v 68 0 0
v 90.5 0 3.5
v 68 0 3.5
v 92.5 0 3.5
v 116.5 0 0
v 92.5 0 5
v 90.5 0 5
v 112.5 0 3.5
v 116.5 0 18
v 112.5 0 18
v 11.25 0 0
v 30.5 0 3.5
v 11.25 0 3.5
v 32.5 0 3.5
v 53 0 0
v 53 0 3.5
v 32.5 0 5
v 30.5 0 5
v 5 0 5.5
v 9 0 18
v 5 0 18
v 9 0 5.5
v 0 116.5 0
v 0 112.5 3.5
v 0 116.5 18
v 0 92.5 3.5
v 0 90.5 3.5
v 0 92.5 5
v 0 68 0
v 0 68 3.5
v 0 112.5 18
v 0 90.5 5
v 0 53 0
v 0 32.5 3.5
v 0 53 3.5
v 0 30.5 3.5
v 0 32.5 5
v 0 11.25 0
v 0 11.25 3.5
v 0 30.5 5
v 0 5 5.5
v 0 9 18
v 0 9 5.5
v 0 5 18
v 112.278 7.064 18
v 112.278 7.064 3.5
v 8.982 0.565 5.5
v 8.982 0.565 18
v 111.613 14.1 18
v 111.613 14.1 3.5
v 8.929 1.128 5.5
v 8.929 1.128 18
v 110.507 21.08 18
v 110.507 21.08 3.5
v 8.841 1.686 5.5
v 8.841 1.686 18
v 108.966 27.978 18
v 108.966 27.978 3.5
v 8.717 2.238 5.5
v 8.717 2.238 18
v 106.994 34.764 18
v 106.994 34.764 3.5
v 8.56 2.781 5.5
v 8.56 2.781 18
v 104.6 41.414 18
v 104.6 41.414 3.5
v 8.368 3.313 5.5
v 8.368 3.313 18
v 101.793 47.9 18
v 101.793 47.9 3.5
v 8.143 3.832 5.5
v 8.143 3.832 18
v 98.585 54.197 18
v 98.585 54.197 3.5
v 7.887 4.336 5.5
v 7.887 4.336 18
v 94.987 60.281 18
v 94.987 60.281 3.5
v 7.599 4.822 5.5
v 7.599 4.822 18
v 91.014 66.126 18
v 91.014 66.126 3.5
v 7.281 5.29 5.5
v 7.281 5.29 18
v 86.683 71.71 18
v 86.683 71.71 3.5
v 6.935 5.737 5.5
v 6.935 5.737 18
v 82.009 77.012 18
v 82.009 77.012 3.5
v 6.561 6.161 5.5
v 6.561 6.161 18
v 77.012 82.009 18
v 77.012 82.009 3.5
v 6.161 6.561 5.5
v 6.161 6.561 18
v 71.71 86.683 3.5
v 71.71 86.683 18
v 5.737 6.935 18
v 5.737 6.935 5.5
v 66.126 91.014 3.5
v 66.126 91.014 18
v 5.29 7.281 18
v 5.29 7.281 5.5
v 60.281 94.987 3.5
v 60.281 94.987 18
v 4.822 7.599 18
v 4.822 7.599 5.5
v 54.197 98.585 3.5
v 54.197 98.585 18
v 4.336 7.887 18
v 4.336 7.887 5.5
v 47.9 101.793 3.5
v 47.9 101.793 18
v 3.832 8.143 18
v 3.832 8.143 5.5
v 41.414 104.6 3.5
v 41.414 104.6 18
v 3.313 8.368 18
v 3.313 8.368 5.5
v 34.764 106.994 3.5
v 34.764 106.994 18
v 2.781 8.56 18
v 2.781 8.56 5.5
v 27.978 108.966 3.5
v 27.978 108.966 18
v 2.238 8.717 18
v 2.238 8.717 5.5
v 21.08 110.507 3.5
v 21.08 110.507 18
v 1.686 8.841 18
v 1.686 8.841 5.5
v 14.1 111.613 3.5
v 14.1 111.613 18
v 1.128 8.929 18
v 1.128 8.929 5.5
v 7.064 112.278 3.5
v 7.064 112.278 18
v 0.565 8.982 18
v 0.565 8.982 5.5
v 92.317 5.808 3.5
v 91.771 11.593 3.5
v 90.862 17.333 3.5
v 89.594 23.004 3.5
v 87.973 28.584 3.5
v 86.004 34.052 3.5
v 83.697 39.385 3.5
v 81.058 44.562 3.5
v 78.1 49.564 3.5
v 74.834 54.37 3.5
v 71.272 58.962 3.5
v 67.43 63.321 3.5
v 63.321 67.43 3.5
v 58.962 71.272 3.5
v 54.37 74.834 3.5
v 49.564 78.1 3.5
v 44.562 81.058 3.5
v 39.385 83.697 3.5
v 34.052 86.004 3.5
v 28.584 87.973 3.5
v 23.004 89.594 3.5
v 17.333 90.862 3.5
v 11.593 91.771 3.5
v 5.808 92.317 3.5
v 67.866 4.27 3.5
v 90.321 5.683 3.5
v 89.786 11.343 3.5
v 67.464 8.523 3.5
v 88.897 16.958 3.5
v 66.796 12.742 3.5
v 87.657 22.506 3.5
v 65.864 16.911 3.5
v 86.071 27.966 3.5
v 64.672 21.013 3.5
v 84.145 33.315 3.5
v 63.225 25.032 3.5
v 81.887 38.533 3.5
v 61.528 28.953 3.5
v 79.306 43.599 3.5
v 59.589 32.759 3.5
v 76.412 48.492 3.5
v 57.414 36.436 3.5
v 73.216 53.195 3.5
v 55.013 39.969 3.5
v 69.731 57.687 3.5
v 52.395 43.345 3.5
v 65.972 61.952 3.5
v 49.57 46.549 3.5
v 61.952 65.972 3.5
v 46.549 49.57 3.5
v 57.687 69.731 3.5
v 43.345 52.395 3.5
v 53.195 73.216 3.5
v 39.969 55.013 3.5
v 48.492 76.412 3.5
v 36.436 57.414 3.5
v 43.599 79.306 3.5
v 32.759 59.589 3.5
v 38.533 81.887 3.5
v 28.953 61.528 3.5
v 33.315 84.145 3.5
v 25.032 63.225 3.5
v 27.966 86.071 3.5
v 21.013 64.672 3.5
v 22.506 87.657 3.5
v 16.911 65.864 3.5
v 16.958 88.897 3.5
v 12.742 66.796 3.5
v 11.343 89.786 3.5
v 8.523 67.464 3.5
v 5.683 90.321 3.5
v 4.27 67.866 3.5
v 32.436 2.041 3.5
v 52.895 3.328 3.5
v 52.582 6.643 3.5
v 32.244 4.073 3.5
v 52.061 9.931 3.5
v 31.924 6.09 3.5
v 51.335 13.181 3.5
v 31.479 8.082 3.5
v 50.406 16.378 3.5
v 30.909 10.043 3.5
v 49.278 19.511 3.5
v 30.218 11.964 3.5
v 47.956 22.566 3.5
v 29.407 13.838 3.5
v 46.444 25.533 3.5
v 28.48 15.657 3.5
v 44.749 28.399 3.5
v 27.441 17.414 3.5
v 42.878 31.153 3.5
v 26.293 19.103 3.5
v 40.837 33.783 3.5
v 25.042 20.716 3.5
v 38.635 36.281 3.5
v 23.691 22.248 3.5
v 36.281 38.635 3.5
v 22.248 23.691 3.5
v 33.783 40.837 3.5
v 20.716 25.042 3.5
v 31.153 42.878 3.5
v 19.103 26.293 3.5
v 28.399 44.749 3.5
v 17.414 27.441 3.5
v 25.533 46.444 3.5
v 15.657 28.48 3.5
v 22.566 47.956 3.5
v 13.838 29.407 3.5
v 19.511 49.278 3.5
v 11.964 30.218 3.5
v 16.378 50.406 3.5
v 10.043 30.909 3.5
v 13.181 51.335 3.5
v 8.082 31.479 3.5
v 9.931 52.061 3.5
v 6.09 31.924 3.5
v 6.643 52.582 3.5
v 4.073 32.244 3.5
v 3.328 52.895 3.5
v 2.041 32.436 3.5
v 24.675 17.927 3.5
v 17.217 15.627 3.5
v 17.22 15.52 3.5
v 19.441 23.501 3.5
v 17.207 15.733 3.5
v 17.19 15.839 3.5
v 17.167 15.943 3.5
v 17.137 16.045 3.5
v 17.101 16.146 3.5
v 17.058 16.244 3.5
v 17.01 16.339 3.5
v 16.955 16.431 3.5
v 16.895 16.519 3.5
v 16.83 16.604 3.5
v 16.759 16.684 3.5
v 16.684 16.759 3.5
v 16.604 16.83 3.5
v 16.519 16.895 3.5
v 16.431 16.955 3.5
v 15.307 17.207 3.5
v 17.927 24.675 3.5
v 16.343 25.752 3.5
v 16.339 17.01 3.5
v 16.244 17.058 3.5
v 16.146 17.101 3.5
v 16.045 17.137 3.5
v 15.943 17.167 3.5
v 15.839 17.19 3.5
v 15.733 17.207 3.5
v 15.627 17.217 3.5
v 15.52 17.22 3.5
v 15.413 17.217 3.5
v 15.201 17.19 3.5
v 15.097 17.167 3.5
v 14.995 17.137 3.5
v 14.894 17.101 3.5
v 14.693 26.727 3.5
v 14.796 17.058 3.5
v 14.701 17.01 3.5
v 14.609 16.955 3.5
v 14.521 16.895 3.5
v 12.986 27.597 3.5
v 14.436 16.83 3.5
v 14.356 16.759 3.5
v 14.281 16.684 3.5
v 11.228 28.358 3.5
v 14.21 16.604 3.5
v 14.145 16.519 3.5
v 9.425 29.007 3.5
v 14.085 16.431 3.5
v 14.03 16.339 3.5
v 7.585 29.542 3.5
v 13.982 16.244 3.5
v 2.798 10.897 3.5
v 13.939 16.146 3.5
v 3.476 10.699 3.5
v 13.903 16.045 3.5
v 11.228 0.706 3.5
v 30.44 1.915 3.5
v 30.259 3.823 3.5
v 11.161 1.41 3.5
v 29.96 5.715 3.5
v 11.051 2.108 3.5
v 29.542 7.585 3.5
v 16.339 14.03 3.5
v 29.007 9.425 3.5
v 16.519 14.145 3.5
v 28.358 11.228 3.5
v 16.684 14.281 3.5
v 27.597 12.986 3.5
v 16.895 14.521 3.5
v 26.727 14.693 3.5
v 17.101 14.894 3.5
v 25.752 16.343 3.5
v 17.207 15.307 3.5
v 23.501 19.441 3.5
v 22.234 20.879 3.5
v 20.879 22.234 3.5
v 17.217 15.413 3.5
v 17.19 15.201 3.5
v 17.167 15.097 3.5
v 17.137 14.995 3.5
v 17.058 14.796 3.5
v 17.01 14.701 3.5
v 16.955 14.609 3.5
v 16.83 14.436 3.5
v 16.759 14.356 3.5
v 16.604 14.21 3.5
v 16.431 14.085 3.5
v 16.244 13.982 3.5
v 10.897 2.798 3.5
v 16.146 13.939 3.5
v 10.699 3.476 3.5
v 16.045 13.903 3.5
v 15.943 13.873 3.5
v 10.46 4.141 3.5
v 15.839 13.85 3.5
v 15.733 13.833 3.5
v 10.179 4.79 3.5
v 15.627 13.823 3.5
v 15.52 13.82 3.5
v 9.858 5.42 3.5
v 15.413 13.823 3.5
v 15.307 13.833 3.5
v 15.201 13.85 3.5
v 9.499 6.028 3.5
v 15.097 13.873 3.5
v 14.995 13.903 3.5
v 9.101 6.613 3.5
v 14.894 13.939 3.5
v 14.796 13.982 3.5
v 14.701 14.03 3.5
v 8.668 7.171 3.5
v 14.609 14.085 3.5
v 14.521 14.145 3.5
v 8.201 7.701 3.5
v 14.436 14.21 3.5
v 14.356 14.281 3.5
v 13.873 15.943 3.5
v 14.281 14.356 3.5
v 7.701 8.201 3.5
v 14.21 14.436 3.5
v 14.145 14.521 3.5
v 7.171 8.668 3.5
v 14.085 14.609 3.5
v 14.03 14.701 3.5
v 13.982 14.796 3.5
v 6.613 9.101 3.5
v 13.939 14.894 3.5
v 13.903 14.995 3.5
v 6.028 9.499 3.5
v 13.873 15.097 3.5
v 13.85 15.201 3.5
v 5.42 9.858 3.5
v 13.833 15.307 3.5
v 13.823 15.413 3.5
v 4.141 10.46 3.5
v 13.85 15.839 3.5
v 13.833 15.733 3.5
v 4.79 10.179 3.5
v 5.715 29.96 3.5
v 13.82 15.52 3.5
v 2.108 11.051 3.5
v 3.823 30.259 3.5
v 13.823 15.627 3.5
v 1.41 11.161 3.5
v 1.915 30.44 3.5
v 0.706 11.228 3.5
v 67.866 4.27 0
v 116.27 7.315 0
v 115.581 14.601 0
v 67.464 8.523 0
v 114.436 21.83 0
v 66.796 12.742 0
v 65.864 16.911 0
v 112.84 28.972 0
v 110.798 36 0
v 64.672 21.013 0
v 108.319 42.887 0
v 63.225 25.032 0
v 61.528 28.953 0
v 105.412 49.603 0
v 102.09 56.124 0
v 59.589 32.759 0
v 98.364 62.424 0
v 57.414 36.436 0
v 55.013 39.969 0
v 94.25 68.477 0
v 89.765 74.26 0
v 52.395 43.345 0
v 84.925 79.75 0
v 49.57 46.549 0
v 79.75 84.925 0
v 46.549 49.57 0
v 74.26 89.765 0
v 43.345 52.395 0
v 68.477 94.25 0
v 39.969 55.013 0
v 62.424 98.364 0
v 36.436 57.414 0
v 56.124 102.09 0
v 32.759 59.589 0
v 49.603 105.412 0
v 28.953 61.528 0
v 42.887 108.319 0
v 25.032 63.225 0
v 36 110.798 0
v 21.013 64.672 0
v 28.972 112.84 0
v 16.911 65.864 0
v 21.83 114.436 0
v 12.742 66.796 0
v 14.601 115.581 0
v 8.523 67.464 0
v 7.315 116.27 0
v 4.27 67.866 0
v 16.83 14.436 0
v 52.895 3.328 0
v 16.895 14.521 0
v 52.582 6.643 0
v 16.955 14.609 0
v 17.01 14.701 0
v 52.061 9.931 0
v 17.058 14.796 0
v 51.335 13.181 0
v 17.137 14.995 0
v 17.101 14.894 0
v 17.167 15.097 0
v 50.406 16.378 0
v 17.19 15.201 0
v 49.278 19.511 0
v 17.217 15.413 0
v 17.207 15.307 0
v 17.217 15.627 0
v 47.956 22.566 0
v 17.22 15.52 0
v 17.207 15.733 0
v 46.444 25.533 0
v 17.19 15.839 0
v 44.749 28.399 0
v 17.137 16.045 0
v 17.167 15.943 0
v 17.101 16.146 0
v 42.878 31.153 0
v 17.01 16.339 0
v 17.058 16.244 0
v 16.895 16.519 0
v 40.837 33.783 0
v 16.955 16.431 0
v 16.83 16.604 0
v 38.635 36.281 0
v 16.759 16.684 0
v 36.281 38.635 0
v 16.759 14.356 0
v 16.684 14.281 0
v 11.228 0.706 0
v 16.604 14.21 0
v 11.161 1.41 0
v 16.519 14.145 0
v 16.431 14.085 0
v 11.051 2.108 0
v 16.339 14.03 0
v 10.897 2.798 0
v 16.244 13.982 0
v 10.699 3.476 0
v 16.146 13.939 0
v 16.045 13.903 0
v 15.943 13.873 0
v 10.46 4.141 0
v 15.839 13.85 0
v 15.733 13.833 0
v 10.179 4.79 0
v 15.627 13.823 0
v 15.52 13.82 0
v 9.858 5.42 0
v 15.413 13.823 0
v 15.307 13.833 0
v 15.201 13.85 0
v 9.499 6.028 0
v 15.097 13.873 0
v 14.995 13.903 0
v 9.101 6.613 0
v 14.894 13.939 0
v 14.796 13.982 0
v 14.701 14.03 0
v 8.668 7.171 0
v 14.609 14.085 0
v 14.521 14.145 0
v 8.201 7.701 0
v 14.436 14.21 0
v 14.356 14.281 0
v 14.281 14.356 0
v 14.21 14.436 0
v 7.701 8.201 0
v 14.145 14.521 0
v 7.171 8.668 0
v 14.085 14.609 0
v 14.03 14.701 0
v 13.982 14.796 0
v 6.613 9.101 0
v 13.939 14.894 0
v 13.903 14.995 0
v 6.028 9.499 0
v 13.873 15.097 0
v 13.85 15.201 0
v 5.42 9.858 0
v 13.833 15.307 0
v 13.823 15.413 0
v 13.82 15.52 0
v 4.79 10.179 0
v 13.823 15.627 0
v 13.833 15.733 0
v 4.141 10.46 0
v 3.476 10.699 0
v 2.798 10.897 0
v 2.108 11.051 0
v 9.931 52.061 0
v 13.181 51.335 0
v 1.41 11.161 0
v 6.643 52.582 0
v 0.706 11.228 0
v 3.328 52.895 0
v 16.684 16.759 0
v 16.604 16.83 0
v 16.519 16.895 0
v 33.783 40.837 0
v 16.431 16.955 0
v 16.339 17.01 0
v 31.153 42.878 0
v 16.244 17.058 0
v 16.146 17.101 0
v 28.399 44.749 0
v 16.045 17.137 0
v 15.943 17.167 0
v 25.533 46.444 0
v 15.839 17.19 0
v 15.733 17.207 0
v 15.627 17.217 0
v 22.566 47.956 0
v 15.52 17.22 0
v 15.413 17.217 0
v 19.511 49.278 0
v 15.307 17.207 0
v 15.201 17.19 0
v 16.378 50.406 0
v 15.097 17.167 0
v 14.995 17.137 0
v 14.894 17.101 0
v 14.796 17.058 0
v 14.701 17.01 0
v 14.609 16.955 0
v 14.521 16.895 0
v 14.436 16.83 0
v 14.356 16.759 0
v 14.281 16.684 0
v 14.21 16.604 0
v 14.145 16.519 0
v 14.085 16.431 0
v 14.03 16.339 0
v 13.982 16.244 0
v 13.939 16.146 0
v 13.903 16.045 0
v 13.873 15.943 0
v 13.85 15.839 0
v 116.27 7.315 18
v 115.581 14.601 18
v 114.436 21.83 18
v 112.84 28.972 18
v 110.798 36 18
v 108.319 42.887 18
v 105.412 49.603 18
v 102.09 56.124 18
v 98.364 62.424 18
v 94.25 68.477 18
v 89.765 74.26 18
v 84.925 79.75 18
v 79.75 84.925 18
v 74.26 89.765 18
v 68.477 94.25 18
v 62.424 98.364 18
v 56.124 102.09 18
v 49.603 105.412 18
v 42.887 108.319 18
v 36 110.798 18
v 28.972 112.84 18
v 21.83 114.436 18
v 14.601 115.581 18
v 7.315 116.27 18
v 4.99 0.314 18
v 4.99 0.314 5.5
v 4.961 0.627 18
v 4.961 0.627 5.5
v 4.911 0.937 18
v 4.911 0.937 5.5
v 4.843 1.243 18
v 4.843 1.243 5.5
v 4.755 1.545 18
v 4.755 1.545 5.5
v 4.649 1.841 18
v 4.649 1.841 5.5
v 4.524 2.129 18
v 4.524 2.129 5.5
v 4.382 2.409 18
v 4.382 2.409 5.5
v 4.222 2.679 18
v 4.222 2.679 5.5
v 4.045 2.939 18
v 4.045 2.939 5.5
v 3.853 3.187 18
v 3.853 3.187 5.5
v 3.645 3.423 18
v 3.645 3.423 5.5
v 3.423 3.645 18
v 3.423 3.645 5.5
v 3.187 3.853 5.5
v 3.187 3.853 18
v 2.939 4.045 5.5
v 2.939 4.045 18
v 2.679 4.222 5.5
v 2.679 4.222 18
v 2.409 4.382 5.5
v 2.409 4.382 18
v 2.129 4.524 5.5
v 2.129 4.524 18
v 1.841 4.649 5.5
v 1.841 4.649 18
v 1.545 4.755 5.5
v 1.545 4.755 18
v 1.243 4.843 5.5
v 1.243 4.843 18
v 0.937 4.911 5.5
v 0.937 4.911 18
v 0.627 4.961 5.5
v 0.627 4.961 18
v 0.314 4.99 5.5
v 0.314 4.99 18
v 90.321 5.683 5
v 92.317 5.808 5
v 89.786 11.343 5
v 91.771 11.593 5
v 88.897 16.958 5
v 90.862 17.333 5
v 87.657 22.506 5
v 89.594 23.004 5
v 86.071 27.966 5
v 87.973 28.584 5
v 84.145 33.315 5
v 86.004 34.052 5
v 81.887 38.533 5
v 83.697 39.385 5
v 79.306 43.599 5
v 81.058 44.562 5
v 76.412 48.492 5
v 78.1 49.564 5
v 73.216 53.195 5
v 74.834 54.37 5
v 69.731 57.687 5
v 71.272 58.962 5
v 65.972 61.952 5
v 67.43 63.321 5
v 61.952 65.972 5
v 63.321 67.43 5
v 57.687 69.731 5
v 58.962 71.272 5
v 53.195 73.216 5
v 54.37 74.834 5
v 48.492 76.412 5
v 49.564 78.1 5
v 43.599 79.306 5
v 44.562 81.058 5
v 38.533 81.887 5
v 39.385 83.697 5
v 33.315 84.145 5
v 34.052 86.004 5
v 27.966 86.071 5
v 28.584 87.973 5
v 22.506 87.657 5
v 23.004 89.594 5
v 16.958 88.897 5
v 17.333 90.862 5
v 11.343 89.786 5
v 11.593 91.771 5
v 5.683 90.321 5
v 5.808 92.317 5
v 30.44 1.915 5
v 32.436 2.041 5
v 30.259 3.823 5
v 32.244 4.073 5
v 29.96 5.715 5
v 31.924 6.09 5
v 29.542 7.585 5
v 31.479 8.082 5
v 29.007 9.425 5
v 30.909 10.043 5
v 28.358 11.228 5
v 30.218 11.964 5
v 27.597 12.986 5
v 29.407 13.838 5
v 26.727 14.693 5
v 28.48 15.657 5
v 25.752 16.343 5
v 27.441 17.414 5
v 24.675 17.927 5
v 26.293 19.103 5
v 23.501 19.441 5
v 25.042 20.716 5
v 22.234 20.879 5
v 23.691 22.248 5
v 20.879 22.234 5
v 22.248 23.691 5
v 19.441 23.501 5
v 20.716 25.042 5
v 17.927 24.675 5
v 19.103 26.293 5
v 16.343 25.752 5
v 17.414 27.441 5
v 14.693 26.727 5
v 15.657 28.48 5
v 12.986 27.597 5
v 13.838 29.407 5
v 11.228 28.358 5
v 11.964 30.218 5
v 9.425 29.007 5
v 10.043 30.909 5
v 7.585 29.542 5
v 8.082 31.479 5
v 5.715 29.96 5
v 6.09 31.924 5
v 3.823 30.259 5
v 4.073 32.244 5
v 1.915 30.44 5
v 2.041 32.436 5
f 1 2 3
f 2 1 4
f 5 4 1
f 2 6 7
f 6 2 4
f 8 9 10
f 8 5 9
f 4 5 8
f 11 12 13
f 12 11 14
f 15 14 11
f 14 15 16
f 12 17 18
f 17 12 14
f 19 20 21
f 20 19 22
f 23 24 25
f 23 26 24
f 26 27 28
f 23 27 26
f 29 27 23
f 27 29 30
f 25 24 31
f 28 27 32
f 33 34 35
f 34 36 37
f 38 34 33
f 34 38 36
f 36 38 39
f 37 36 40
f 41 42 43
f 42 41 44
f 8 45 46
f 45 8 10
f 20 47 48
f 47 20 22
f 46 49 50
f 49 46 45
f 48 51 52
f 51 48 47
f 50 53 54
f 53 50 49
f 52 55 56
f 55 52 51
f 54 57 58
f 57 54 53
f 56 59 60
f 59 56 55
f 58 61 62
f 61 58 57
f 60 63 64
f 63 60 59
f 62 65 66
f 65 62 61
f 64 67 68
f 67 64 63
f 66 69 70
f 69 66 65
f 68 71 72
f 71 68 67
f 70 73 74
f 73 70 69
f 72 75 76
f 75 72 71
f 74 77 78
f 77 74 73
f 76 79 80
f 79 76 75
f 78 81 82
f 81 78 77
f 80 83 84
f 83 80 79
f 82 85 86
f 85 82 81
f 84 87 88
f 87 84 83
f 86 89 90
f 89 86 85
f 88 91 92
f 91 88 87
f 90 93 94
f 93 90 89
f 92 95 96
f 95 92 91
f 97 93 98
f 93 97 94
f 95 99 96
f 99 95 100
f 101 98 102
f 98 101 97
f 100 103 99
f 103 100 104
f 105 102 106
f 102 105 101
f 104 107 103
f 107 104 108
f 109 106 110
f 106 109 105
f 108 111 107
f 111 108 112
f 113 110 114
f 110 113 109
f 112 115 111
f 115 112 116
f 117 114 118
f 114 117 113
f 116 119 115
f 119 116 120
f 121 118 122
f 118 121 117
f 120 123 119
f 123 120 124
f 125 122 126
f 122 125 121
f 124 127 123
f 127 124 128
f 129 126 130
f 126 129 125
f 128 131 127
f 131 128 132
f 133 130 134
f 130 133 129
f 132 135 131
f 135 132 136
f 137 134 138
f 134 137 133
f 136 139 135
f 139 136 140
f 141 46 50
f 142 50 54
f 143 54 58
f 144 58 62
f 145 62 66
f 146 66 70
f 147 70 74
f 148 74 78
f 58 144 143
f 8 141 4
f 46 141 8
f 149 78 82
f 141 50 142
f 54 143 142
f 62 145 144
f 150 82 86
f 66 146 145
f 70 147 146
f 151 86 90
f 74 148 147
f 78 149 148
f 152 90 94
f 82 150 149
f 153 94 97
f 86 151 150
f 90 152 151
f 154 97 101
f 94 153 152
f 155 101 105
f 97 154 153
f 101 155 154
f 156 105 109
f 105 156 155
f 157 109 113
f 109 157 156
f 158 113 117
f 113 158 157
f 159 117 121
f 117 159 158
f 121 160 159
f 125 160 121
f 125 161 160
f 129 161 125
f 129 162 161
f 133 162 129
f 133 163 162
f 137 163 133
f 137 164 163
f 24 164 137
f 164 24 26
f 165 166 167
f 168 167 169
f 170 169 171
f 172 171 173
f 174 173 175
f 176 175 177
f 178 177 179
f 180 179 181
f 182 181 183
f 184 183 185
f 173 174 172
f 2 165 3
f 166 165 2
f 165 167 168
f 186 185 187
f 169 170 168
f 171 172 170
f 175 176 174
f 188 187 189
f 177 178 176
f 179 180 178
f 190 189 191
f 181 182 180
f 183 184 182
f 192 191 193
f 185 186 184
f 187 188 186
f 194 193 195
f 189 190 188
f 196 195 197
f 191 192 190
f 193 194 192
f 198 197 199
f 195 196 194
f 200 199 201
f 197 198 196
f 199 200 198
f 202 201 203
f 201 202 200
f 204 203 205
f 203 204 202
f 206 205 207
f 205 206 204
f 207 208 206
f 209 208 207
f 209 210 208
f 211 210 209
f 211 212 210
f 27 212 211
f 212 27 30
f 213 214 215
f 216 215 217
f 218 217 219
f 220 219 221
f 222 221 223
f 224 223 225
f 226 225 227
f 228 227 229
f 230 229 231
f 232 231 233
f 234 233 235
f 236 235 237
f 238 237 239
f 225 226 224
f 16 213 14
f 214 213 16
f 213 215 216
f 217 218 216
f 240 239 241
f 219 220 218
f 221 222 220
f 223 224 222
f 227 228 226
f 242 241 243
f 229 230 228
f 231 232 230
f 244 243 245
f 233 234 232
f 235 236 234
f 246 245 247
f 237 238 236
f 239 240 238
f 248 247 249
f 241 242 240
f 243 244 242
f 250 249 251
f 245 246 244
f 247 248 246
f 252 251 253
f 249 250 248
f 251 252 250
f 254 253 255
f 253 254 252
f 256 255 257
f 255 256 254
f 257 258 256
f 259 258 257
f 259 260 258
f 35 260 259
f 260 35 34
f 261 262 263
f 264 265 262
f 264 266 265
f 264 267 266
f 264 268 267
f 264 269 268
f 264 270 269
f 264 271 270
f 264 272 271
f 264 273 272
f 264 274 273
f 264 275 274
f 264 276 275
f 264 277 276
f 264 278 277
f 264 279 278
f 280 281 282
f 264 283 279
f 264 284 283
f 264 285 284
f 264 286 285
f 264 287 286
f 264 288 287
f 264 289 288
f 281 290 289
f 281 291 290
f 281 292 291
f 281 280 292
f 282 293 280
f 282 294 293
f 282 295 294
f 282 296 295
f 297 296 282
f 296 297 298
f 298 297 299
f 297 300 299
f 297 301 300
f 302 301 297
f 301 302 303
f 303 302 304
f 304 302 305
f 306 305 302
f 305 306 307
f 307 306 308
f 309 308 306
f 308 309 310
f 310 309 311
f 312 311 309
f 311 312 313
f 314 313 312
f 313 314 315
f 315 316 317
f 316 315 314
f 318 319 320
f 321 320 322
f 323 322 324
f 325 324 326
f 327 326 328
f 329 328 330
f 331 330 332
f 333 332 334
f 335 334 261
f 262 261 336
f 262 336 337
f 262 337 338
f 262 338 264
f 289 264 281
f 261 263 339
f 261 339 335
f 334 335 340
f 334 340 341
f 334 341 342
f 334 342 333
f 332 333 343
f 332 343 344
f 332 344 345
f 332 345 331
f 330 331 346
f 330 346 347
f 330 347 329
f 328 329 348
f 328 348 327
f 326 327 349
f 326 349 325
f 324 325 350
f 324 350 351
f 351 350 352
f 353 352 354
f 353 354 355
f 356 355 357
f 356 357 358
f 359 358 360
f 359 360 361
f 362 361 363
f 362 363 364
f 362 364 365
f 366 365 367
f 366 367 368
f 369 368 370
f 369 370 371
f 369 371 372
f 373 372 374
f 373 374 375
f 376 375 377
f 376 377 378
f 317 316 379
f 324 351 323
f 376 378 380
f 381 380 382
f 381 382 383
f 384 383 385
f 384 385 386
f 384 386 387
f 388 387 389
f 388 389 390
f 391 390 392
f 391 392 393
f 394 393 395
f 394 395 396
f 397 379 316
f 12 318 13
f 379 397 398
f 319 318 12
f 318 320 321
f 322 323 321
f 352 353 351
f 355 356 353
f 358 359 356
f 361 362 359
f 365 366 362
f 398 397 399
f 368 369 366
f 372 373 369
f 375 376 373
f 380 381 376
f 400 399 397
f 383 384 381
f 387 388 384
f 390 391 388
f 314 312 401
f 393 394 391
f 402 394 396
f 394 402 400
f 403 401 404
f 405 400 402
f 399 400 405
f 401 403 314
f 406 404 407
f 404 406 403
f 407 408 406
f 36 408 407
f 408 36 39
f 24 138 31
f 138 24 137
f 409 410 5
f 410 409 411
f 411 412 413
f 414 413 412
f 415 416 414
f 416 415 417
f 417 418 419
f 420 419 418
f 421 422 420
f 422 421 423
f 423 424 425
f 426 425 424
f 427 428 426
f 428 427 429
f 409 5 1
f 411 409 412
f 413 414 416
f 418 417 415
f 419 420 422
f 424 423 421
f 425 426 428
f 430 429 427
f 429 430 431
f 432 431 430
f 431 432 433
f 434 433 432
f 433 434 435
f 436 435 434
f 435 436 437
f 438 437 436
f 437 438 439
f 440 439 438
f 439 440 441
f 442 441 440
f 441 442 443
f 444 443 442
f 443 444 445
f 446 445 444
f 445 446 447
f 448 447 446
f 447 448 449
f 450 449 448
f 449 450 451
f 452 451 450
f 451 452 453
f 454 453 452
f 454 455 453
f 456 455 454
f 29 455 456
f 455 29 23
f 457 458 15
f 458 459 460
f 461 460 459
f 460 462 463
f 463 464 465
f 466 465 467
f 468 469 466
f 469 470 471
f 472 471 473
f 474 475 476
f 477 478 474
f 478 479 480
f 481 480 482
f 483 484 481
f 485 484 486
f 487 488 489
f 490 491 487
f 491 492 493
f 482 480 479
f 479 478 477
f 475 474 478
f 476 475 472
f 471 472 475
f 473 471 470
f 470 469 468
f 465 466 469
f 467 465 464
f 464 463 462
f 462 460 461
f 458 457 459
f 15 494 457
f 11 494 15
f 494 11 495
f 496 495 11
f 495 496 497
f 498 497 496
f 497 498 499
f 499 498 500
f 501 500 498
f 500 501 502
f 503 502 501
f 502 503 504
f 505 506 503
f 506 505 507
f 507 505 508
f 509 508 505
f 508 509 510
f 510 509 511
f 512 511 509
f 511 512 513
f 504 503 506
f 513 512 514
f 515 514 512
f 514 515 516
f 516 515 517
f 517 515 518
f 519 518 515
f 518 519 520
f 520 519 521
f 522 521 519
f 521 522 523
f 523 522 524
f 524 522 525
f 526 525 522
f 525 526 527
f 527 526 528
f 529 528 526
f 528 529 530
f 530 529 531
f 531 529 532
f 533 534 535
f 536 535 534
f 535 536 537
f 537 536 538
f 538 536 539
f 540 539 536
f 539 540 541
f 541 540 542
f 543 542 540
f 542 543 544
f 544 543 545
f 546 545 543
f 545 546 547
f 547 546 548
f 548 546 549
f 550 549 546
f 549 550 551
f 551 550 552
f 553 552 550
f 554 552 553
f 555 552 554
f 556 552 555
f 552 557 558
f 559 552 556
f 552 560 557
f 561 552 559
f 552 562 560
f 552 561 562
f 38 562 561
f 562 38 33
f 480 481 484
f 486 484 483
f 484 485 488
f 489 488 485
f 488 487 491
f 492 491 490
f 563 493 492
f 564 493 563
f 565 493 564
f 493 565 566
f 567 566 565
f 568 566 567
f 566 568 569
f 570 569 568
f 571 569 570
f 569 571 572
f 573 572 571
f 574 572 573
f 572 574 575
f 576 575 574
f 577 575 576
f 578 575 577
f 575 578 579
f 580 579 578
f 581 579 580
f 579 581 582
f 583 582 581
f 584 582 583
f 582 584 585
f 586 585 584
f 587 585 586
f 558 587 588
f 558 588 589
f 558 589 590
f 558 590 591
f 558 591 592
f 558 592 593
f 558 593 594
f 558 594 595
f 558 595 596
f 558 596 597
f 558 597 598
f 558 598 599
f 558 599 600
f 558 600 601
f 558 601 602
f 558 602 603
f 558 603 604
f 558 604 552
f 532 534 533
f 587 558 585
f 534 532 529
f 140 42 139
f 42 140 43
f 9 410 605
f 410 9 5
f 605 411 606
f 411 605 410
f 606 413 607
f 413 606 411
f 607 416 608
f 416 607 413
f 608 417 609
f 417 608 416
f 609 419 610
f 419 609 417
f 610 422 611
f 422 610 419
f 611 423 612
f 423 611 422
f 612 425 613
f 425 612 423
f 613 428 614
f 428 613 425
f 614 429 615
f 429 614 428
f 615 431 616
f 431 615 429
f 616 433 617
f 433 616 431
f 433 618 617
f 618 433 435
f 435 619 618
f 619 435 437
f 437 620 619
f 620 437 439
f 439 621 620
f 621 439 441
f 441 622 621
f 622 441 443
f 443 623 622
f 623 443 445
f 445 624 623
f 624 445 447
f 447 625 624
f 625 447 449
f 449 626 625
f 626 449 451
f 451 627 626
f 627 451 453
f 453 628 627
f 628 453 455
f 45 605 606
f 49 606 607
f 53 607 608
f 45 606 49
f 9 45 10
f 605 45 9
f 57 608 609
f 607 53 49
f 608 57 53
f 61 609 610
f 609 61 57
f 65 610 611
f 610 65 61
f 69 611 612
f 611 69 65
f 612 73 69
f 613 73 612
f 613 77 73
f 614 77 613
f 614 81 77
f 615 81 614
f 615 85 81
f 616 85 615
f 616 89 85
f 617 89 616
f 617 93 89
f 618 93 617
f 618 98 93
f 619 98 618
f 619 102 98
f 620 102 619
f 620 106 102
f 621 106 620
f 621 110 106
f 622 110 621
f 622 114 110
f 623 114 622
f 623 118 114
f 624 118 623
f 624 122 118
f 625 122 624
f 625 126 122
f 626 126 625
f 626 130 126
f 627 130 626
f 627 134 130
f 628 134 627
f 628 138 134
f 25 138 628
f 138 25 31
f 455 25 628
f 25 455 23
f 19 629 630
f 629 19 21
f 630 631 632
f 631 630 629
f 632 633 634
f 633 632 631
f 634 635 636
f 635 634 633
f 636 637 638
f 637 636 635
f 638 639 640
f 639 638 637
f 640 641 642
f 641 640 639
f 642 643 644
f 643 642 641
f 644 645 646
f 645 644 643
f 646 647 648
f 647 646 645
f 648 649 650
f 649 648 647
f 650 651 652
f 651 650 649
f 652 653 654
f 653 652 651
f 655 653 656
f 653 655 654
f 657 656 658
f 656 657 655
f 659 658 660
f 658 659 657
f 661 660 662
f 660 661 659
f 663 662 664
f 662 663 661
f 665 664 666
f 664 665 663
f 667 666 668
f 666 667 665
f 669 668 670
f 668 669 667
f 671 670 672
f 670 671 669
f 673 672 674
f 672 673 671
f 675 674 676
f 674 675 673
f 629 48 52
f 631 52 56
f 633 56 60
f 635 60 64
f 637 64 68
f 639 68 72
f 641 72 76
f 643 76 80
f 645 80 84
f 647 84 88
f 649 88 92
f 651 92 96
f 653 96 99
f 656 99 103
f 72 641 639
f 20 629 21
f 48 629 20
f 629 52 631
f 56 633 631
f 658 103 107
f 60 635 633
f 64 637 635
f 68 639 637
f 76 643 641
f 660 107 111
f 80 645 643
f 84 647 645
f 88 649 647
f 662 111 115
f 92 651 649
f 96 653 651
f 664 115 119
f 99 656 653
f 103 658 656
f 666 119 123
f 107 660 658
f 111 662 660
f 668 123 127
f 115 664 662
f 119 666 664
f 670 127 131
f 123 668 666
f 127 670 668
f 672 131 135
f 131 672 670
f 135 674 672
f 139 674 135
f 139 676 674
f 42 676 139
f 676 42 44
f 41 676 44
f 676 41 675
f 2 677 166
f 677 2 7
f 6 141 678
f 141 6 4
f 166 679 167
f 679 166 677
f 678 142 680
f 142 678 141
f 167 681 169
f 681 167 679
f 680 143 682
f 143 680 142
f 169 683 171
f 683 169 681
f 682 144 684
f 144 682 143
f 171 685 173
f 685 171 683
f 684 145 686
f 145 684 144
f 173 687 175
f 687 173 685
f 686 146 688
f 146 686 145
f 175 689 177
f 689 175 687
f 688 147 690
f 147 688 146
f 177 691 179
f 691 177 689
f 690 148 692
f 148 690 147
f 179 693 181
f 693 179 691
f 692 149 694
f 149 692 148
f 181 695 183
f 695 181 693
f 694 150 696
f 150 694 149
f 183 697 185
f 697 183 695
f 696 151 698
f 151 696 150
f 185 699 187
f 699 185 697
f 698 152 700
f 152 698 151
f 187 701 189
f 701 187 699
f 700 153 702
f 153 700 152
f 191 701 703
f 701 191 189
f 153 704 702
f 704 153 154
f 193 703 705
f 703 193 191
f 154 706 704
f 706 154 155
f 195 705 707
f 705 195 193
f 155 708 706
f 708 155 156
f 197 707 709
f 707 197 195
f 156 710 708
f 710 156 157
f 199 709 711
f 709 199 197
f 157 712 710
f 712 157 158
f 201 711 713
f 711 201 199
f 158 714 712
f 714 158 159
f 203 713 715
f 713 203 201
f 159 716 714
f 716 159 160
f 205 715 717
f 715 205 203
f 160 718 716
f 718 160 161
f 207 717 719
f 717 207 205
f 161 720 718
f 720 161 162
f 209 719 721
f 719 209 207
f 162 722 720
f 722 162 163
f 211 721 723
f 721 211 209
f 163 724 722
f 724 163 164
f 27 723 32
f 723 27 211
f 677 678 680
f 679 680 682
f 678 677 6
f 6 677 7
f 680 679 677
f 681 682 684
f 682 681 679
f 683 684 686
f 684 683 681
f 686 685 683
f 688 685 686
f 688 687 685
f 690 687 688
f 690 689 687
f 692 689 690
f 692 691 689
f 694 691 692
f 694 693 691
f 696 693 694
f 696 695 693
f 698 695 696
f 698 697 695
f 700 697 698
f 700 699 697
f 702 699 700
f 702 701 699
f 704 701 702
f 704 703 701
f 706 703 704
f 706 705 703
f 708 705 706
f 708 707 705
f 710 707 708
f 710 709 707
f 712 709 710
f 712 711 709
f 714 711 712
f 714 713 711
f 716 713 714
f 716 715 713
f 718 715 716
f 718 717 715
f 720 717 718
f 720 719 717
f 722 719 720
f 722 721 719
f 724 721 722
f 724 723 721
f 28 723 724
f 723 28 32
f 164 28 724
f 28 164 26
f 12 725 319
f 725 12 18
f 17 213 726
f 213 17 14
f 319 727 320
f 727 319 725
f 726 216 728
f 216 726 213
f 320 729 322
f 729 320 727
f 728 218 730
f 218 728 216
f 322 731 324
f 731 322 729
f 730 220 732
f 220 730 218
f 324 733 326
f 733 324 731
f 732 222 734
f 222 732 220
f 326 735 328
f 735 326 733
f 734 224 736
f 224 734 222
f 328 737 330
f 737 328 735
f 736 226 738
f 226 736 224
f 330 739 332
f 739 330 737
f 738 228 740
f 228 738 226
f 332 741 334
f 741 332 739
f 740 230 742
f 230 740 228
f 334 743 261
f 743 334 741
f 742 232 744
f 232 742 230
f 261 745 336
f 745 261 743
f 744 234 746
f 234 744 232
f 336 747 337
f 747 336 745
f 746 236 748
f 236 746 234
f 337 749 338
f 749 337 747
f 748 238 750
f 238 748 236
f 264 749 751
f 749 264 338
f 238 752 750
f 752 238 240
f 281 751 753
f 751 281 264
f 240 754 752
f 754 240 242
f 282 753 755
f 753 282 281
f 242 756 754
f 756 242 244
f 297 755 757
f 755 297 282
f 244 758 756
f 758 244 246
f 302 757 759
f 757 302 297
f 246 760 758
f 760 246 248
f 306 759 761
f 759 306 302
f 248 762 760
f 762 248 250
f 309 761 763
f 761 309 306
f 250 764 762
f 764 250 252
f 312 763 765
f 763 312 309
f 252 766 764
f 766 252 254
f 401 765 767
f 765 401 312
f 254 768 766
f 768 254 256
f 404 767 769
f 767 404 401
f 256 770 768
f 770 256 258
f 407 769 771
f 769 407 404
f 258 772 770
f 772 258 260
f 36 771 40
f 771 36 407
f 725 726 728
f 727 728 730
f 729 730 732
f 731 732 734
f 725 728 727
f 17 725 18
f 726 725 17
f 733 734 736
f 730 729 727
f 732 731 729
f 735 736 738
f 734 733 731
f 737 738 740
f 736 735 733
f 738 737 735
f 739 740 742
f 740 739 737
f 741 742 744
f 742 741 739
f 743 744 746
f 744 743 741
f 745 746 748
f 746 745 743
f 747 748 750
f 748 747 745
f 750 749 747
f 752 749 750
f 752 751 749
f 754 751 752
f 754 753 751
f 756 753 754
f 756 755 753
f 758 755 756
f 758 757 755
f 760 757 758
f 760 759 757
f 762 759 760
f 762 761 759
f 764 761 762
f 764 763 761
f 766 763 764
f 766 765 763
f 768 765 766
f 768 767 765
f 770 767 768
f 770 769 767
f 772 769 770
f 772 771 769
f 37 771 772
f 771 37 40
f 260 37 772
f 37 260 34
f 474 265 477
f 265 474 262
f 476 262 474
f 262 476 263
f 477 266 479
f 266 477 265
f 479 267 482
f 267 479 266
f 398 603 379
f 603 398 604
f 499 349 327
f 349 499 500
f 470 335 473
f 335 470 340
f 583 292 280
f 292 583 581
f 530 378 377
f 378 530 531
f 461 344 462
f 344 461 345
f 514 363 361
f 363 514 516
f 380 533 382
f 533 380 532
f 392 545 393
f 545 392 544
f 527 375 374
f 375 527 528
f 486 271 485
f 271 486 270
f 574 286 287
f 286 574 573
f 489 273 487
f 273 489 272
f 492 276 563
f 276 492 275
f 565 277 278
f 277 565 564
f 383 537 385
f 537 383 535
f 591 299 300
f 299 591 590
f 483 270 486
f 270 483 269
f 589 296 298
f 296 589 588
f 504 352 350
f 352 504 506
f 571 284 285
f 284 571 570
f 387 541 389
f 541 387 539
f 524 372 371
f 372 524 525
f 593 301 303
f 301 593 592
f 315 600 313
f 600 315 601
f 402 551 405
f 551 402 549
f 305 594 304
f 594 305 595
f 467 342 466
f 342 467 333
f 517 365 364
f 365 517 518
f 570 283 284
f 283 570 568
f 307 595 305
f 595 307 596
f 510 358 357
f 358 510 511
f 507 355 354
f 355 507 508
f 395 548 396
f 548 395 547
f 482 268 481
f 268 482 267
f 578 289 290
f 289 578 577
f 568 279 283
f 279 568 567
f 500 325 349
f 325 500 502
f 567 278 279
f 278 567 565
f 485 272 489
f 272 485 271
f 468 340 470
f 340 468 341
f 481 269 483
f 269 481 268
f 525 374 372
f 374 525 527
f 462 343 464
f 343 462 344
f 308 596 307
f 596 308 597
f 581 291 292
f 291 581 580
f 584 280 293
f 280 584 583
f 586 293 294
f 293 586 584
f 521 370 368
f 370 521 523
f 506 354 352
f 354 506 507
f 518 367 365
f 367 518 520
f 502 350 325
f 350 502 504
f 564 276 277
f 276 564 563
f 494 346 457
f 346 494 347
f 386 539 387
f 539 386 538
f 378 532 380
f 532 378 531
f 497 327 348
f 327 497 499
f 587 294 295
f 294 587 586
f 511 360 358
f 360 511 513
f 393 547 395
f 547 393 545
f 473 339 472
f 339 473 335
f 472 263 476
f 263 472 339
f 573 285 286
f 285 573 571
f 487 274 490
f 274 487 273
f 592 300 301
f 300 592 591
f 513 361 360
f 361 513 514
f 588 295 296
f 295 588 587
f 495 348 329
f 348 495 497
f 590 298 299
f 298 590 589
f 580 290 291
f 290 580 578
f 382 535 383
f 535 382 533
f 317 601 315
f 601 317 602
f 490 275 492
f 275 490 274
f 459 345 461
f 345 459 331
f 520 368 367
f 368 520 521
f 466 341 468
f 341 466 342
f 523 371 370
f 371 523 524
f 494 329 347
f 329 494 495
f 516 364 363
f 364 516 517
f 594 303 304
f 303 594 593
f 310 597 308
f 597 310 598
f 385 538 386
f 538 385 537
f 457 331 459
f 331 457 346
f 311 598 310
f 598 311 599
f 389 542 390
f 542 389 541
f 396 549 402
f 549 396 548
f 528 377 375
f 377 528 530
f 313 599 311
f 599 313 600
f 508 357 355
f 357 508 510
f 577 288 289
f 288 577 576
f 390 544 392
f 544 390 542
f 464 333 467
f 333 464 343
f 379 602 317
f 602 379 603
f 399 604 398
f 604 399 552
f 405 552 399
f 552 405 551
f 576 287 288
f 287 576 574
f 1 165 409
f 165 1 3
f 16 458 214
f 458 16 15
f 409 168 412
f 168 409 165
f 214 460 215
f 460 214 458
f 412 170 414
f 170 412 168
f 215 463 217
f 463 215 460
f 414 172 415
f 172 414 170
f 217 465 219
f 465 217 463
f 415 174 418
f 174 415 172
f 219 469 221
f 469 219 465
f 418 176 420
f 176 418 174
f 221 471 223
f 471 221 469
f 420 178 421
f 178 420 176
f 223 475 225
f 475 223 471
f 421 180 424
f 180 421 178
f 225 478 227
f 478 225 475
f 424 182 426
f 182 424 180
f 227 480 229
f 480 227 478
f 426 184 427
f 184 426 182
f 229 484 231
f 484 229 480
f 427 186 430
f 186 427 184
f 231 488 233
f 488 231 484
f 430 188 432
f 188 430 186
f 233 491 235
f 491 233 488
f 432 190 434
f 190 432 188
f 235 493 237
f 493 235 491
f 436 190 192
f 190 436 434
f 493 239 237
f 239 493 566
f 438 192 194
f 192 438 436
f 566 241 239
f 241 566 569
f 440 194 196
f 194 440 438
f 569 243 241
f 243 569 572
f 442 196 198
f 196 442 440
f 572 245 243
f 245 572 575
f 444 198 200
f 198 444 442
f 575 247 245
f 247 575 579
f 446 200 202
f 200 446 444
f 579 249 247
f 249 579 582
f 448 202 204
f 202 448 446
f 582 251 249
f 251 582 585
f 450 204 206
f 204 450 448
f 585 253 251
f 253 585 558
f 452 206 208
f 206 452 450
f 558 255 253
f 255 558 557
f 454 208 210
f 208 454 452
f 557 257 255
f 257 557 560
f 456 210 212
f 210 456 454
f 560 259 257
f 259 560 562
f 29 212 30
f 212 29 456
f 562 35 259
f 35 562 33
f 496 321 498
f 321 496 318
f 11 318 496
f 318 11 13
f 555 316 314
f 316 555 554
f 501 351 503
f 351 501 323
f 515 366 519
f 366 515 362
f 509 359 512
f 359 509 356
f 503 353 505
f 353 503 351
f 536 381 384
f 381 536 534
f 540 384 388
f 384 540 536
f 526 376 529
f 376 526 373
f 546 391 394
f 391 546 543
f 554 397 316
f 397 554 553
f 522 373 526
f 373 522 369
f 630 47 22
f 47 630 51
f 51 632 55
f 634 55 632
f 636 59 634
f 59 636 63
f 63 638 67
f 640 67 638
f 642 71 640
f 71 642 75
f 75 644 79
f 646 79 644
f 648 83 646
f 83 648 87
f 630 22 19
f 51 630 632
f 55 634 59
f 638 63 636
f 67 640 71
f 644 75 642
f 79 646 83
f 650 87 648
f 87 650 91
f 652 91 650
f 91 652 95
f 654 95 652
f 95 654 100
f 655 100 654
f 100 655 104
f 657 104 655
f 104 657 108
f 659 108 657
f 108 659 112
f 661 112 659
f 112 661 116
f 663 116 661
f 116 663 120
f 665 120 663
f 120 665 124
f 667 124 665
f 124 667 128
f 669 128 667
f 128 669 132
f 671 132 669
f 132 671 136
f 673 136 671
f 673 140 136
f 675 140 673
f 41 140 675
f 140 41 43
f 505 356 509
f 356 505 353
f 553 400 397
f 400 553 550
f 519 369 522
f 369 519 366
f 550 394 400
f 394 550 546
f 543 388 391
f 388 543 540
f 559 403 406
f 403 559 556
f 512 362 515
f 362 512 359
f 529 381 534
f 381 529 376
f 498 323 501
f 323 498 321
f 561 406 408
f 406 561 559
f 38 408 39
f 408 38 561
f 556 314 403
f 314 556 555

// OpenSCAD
// ====================================================================
// SUSHI CONVEYOR - 180-DEGREE TURNAROUND END MODULE
// Compatible with NEMA 17 Motor (Drive) or 608 Bearing (Idler)
// Designed for Prusa CORE One+ (Fits 250x220mm Bed in Two Quadrants)
// ====================================================================

$fn = 100;

// Dimensions matching Straight Track & Slat
pitch_radius    = 60.5;   // Radius to center of chain (matches 10-tooth sprocket)
slat_width      = 100.0;  // Slat width
track_base_th   = 3.5;
side_wall_th    = 4.0;
side_wall_h     = 18.0;

inner_wall_r    = pitch_radius - slat_width/2 - 1.5; // ~9.0mm
outer_wall_r    = pitch_radius + slat_width/2 + 2.0; // ~112.5mm
slot_r          = pitch_radius;                     // Guide slot radius
slot_w          = 15.0;

// NEMA 17 Dimensions
nema17_width    = 42.3;
nema17_hole_spc = 31.04;
nema17_center_d = 22.5;

module turnaround_quadrant_drive() {
    difference() {
        union() {
            // 90-degree curved floor
            rotate_extrude(angle = 90) {
                translate([inner_wall_r, 0])
                    square([outer_wall_r - inner_wall_r, track_base_th]);
            }
            
            // Outer curved guard wall
            rotate_extrude(angle = 90) {
                translate([outer_wall_r, 0])
                    square([side_wall_th, side_wall_h]);
            }
            
            // Inner hub wall
            rotate_extrude(angle = 90) {
                translate([inner_wall_r - side_wall_th, 0])
                    square([side_wall_th, side_wall_h]);
            }
            
            // Raised glide rib along the curve
            rotate_extrude(angle = 90) {
                translate([pitch_radius + 30, track_base_th])
                    square([2.0, 1.5]);
                translate([pitch_radius - 30, track_base_th])
                    square([2.0, 1.5]);
            }
            
            // Center NEMA 17 Motor Mount Plate
            translate([0, 0, 0])
                cylinder(r = inner_wall_r + 2, h = track_base_th);
        }
        
        // 1. Curved Hinge Guide Slot
        rotate_extrude(angle = 90) {
            translate([slot_r - slot_w/2, -1])
                square([slot_w, track_base_th + 3]);
        }
        
        // 2. NEMA 17 Center Pilot Hole (22mm)
        translate([0, 0, -1])
            cylinder(r = nema17_center_d/2, h = track_base_th + 3);
        
        // 3. NEMA 17 M3 Mounting Bolt Holes
        for (dx = [-nema17_hole_spc/2, nema17_hole_spc/2]) {
            for (dy = [-nema17_hole_spc/2, nema17_hole_spc/2]) {
                translate([dx, dy, -1])
                    cylinder(r = 1.7, h = track_base_th + 3);
            }
        }
    }
}

// Render single 90-degree quadrant (print 2 for a full 180-degree turn)
turnaround_quadrant_drive();
